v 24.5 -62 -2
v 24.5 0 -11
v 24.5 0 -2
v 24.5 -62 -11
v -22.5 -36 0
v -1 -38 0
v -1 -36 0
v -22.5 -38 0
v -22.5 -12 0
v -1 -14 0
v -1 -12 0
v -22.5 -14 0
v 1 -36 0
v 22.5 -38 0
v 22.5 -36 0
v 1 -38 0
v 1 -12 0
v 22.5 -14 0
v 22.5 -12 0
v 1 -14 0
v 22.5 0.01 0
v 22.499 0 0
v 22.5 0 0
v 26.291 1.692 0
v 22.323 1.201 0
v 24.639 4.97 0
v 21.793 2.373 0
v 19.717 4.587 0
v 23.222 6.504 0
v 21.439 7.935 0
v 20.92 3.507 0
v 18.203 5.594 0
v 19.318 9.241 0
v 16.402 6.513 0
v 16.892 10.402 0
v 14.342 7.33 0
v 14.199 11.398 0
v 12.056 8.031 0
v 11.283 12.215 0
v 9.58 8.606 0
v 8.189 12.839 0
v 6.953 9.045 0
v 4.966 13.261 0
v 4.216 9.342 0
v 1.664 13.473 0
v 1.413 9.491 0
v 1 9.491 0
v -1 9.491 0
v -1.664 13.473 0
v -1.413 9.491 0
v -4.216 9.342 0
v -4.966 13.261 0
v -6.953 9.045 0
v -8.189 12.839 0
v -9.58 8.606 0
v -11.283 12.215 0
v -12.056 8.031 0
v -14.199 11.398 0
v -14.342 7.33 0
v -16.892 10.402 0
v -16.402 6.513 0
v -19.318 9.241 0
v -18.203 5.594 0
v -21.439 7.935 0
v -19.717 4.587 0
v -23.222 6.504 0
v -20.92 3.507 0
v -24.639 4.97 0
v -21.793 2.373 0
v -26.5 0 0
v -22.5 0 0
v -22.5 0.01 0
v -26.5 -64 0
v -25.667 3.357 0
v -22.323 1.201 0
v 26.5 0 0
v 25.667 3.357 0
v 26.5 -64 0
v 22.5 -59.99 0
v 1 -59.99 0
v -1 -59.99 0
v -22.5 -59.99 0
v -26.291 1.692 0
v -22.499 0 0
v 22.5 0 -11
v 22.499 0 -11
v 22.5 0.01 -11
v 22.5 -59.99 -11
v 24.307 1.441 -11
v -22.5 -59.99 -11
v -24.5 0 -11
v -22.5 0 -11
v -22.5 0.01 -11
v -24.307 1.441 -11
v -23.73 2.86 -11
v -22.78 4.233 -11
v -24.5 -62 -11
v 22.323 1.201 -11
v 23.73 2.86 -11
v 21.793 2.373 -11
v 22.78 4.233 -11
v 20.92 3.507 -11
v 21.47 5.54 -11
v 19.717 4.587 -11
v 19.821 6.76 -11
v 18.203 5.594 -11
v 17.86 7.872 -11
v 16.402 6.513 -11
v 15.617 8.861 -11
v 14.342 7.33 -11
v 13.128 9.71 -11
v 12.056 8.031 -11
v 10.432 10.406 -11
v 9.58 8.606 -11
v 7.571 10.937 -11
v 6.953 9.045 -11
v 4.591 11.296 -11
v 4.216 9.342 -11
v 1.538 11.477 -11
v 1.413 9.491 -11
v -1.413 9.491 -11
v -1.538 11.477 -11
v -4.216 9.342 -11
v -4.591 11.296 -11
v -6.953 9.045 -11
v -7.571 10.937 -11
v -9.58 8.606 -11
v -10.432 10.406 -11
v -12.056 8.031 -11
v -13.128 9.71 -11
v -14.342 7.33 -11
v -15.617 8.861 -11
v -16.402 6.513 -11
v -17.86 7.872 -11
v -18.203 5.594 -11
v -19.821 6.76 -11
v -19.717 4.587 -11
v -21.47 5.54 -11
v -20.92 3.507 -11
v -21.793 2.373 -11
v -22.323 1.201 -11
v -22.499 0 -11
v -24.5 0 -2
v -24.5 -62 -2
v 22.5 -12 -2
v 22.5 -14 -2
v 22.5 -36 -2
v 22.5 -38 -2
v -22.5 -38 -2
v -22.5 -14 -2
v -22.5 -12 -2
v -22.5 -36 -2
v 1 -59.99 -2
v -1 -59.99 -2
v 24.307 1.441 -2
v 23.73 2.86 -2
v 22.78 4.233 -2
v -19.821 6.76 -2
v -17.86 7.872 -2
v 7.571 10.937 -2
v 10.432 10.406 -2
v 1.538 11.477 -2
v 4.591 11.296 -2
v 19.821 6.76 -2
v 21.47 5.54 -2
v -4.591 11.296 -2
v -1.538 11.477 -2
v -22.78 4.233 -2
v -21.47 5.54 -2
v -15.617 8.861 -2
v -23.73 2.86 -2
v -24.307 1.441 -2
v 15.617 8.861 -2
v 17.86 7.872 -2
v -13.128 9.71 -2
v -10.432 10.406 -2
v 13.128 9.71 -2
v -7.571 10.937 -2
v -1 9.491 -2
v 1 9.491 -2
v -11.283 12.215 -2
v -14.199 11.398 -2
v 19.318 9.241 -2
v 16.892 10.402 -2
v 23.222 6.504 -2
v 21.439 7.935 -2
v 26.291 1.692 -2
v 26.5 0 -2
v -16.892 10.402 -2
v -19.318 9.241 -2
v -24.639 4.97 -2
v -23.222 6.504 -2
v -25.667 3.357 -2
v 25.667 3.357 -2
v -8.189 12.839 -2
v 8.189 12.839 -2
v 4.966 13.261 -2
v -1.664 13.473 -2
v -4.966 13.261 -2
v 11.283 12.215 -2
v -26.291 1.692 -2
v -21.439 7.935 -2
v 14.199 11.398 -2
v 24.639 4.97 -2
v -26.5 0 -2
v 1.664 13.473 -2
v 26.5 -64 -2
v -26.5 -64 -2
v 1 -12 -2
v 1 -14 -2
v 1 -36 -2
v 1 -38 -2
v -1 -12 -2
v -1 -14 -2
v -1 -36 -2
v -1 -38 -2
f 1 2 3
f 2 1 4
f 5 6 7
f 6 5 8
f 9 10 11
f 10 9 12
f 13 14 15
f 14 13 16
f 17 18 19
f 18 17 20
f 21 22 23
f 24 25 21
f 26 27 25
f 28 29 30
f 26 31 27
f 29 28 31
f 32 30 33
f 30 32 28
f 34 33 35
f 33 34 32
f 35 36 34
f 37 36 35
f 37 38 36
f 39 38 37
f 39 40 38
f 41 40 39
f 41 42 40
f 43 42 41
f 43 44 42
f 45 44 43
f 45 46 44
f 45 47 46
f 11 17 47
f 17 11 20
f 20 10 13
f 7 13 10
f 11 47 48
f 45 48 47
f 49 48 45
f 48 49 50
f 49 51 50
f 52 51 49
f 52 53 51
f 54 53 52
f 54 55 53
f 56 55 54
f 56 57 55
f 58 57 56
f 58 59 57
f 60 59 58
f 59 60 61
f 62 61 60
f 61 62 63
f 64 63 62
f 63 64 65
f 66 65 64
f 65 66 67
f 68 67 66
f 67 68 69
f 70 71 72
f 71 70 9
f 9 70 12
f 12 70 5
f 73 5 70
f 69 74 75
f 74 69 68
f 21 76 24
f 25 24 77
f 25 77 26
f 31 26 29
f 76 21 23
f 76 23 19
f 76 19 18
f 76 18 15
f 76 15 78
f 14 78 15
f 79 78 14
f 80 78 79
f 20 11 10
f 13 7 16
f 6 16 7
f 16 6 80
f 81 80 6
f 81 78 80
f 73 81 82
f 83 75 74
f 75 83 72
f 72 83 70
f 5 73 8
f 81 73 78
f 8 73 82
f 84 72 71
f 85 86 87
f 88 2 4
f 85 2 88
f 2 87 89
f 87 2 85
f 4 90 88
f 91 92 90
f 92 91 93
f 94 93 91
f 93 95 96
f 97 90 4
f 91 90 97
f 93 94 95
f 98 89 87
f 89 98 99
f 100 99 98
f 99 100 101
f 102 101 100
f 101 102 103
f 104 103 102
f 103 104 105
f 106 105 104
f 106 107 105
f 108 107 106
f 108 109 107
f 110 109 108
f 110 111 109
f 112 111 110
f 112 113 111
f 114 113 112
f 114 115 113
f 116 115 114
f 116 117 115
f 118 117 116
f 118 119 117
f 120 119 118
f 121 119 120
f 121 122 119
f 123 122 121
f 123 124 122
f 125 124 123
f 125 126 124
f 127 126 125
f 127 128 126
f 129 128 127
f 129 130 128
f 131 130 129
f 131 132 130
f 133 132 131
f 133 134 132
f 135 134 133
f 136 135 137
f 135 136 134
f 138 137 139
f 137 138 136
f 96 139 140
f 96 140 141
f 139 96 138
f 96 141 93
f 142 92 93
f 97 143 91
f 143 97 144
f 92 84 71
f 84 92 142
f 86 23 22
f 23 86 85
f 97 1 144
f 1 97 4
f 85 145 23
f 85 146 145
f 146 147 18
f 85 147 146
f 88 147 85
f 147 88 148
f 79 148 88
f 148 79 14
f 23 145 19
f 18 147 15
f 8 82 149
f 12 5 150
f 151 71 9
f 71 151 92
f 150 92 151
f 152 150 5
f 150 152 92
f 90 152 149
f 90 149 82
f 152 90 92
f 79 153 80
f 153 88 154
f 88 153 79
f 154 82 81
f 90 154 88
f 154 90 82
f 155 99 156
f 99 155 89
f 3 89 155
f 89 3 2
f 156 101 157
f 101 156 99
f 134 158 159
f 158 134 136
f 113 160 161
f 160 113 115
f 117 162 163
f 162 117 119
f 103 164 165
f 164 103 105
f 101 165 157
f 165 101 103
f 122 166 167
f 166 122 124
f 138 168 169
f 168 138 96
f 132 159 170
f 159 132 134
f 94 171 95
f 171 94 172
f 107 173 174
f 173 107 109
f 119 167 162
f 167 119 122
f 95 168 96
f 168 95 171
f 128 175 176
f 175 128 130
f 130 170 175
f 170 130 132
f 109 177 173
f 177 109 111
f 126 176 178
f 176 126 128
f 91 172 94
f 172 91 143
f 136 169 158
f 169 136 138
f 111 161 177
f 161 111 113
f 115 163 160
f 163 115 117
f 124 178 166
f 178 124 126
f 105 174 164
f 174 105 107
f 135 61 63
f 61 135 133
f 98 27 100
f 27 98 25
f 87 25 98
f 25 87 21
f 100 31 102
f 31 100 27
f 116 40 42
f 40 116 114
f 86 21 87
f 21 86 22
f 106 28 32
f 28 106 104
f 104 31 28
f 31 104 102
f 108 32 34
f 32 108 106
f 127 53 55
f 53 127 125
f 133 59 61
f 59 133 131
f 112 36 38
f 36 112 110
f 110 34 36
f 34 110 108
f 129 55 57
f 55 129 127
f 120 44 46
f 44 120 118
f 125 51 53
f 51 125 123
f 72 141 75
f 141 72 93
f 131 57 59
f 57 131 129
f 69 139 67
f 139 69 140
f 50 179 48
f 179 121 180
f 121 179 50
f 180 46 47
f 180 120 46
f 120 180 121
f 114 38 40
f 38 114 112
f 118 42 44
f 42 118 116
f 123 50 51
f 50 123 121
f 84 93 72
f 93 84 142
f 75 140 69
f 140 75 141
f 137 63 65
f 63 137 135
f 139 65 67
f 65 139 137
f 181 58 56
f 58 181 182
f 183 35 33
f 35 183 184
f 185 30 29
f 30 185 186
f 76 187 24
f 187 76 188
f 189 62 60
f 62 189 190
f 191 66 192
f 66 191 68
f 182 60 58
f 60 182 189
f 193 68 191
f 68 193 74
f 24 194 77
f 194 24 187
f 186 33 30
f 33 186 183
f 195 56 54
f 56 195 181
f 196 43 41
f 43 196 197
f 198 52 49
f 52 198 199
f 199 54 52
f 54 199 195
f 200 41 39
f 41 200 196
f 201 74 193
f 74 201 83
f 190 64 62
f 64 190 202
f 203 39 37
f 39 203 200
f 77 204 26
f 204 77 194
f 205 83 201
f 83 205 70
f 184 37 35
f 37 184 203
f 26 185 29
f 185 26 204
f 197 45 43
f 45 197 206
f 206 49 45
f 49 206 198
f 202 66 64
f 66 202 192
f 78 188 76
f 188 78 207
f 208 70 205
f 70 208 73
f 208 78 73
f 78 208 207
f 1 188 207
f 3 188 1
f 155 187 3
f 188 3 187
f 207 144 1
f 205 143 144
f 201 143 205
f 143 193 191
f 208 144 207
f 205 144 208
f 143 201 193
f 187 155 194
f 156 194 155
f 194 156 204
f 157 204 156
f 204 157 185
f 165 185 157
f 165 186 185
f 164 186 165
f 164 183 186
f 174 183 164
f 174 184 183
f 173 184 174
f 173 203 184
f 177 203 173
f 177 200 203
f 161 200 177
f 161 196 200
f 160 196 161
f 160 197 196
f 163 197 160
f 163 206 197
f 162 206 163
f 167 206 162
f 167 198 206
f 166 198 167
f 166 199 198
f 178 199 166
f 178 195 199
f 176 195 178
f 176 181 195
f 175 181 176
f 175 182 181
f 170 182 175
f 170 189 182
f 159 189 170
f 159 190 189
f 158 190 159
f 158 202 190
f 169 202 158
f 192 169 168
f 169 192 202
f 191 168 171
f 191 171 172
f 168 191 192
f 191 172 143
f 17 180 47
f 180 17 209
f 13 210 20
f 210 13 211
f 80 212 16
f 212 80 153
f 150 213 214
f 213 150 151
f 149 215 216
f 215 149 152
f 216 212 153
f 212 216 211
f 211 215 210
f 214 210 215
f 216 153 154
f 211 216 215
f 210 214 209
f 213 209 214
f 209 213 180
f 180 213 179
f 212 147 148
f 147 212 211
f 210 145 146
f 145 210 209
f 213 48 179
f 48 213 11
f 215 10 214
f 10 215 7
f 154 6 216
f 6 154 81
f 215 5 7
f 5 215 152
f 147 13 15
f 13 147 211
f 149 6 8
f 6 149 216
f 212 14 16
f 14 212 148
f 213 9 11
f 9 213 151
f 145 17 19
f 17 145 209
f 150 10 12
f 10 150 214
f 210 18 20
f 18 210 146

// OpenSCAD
$fn=50+0;

depth    =  9;
thick    =  2;
border   =  4;
transomD =  2;
transomW =  2;
squareW  = 45;
squareH  = 60;
circleH  = 19;
transomO1= 22;
transomO2= 46;

//Vertical frame
difference(){
    square(squareW+2*thick,squareH+thick,depth+thick);
    translate([0,0.01,0.01]){square(squareW,squareH,depth+thick+0.02);}
}
difference(){
    circle(  squareW+2*thick,  circleH+thick*2  ,depth+thick);
    translate([0,0.01,0.01]){
        circle(squareW,circleH,depth+thick+0.02);
    }
    
    translate([-squareW,-circleH*2,-(depth+thick)-0.01]){ 
        cube([squareW*2,circleH*2,depth+thick+0.02]); 
    }
}


//Horizontal frame
difference(){
   union(){
        difference(){
            circle(squareW+border*2,circleH+border*2,depth+thick);
            translate([0,0.01,0.01]){circle(squareW,circleH, depth+thick+0.02);}   
            translate([-squareW,-circleH*2,-(depth+thick)-0.01]){ 
                cube([squareW*2,circleH*2,depth+thick+0.02]); 
            }
        }
        difference(){
            square(squareW+border*2,squareH+border,depth+thick);
            translate([0,0.01,0.01]){square(squareW,squareH,depth+thick+0.02);}
        }
    }
    w = squareW+border*2+thick*2;
    h = squareH+circleH;
    translate([-w/2-1,-squareH-border-thick-1, -depth-thick-thick]){
        cube([w+2,h+2,depth+thick]);
    }
}

//Transom
translate([-transomW/2,-squareH,-transomD]){
    cube([transomW,squareH+circleH/2,transomD]);
}


translate([-squareW/2, -squareH+transomO1, -transomD]){
    cube([squareW,transomW,transomD]);
}

translate([-squareW/2, -squareH+transomO2, -transomD]){
    cube([squareW,transomW,transomD]);
}



module circle(w,h,d){    

    scale = h/w;
    
    scale([1,scale,1]){
        translate([0,0,-d]){
            cylinder(r=w/2,h=d);
        }
    }    
}


module square(w,h,d){
    translate([-w/2,-h,-d]){
        cube([w,h,d]);
    }  
}   
